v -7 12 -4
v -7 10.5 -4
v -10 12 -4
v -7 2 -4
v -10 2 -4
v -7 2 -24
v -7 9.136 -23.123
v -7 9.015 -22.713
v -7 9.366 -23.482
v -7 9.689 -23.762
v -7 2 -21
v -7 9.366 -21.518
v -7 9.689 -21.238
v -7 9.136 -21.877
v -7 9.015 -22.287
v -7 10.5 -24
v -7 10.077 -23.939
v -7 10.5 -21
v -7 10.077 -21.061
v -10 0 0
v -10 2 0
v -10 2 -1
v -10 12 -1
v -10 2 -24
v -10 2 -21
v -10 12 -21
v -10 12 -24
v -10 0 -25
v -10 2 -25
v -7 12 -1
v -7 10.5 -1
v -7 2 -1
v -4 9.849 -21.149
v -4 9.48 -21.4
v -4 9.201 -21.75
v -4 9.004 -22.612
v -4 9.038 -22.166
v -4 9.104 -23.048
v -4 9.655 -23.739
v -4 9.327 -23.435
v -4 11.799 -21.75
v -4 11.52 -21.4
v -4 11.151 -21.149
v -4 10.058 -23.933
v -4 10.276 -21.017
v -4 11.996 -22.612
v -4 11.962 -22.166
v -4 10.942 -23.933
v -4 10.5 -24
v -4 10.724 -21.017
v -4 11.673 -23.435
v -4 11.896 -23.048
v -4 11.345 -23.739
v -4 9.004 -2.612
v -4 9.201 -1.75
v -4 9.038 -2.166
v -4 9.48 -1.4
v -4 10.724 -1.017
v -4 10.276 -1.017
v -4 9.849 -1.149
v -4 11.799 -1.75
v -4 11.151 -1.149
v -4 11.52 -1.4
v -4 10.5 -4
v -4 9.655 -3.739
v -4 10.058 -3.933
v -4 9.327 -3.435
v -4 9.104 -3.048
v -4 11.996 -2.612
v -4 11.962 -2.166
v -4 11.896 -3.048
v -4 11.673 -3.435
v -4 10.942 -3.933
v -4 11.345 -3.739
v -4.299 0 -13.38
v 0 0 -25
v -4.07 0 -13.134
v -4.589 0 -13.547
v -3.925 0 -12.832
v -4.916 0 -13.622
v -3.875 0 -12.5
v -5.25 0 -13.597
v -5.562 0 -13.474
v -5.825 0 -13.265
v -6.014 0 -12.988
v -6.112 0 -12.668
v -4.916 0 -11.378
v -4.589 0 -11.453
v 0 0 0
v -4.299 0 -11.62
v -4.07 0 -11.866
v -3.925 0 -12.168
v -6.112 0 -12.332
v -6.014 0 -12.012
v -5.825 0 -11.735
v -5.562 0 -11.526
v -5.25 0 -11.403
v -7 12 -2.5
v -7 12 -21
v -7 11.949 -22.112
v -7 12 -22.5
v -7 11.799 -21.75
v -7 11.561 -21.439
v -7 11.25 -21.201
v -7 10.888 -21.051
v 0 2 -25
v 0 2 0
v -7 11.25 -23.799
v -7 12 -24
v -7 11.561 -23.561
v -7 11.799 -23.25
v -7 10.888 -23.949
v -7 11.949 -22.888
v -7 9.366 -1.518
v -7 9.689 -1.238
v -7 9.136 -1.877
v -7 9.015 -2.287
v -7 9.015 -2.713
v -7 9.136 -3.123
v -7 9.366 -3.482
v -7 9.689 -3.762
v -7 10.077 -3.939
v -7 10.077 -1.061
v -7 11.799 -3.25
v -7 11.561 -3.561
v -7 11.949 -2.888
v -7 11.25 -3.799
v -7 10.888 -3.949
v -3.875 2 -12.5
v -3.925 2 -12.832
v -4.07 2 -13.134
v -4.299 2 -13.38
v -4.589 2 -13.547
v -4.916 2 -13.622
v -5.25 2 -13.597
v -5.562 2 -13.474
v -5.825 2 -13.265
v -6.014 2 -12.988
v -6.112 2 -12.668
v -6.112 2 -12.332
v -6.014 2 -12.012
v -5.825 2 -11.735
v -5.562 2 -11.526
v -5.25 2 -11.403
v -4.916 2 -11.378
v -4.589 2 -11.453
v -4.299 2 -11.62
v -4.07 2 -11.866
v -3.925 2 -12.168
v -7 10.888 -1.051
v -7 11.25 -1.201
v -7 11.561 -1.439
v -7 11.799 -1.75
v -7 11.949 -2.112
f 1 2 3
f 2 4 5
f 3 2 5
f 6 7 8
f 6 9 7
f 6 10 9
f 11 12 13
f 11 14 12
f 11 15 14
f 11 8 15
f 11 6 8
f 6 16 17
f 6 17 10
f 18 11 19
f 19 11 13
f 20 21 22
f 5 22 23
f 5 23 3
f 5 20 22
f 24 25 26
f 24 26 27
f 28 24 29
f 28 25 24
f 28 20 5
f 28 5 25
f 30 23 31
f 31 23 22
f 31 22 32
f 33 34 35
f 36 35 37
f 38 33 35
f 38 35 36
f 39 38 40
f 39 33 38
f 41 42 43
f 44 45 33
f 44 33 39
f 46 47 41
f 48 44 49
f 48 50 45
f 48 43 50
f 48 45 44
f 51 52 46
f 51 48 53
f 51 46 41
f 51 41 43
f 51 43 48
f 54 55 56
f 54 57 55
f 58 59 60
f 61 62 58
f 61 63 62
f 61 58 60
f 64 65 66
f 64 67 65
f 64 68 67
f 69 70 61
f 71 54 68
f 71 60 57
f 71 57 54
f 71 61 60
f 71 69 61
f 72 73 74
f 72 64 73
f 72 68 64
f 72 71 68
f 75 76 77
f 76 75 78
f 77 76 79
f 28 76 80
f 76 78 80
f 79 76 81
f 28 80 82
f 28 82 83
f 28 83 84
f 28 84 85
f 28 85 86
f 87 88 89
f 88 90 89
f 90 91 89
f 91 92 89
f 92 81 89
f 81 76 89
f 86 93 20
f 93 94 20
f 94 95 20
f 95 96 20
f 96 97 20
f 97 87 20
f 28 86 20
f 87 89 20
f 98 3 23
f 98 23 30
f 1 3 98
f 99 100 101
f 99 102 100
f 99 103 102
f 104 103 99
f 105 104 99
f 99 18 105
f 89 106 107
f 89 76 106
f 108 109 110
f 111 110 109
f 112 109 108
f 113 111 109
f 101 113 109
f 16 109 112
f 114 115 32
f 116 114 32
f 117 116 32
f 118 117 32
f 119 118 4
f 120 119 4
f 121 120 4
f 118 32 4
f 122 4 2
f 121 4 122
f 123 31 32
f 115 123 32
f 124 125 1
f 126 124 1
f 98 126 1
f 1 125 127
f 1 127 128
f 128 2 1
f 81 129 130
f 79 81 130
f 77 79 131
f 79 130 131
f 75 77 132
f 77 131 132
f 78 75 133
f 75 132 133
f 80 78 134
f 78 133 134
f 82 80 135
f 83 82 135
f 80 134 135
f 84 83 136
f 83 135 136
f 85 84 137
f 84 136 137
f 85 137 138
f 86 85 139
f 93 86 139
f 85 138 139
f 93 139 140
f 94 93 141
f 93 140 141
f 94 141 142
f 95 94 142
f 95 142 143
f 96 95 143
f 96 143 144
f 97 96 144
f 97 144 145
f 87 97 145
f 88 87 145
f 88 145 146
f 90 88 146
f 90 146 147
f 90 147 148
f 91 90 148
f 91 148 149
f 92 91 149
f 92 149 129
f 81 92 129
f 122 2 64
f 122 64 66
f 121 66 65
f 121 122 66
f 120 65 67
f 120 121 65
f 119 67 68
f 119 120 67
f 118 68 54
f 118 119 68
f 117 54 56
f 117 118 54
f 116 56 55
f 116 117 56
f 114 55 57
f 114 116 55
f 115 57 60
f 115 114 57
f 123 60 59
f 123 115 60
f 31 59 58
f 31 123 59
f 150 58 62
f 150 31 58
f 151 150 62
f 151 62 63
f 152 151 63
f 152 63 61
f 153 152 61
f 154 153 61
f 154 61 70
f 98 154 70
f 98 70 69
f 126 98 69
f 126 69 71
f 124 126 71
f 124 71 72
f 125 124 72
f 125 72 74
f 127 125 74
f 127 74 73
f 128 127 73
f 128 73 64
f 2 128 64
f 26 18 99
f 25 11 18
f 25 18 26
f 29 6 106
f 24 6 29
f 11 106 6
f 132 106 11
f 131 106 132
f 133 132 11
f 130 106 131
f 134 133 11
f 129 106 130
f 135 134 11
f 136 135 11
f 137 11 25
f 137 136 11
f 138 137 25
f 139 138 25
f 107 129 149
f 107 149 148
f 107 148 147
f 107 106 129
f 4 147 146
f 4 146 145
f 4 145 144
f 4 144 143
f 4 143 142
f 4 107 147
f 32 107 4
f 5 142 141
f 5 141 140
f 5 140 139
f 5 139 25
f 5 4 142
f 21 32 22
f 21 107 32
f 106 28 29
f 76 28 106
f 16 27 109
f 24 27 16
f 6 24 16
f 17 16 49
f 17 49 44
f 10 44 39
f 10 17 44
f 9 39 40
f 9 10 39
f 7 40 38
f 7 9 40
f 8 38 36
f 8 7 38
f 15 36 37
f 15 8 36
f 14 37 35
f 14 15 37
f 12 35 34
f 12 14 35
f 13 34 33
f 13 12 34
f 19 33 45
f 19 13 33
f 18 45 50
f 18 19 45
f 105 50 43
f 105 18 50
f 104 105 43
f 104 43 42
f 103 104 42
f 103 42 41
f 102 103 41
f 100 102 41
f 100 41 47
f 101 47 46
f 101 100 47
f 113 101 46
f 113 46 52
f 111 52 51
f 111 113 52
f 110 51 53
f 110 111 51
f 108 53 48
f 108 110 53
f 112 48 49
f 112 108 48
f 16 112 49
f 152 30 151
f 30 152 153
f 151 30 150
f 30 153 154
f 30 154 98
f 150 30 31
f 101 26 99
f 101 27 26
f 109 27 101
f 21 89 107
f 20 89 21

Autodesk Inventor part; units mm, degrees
ref_plane "YZ Plane" through (0, 0, 0) normal (1, 0, 0) x (0, 1, 0)
ref_plane "XZ Plane" through (0, 0, 0) normal (0, 1, 0) x (-1, 0, 0)
ref_plane "XY Plane" through (0, 0, 0) normal (0, 0, 1) x (1, 0, 0)
sketch "Sketch1" plane through (0, 0, 0) normal (0, 1, 0) x (-1, 0, 0)
  line L0 (0, 0) -> (10, 0)
  line L1 (10, 0) -> (10, -25)
  line L2 (10, -25) -> (0, -25)
  line L3 (0, -25) -> (0, 0)
  dimension "d0" = 10
  dimension "d1" = 25
extrude "Extrusion1" add sketch "Sketch1" along normal blind 2
sketch "Sketch2" plane through (0, 2, 0) normal (0, 1, 0) x (1, 0, 0)
  line L0 (-10, 0) -> (0, 0) projected
  line L1 (-10, 0) -> (-10, 1)
  line L2 (-10, 1) -> (-7, 1)
  line L3 (-7, 1) -> (-7, 4)
  line L4 (-7, 4) -> (-10, 4)
  line L5 (-10, 4) -> (-10, 1)
  line L6 (0, 25) -> (-10, 25) projected
  line L7 (-10, 25) -> (-10, 24)
  line L8 (-10, 24) -> (-7, 24)
  line L9 (-7, 24) -> (-7, 21)
  line L10 (-7, 21) -> (-10, 21)
  line L11 (-10, 21) -> (-10, 24)
  dimension "d4" = 1
  dimension "d5" = 3
  dimension "d6" = 3
  dimension "d7" = 1
  dimension "d8" = 3
  dimension "d9" = 3
extrude "Extrusion2" add sketch "Sketch2" along normal blind 10
sketch "Sketch3" plane through (-7, 2, -1) normal (1, 0, 0) x (0, 0, -1)
  line L0 (0, 0) -> (0, 10) projected
  line L1 (0, 10) -> (1.5, 10)
  line L2 (1.5, 10) -> (1.5, 8.5)
  line L3 (1.5, 8.5) -> (0, 8.5)
  line L4 (0, 8.5) -> (0, 10)
  line L5 (23, 10) -> (20, 10) projected
  line L6 (23, 10) -> (21.5, 10)
  line L7 (21.5, 10) -> (21.5, 8.5)
  line L8 (21.5, 8.5) -> (23, 8.5)
  line L9 (23, 8.5) -> (23, 10)
  circle A0 centre (1.5, 8.5) radius 1.5
  circle A1 centre (21.5, 8.5) radius 1.5
  point P0 (-1, -2)
  dimension "d12" = 1.5
  dimension "d13" = 1.5
  dimension "d14" = 1.5
  dimension "d15" = 1.5
  dimension "d16" = 3
  dimension "d17" = 3
extrude "Extrusion3" add sketch "Sketch3" along normal blind 3 contours A0 L2 L3 | L3 L2 A0 | A1 L8 L7 | L7 L8 A1
sketch "Sketch4" plane through (0, 2, 0) normal (0, 1, 0) x (1, 0, 0)
  line L0 (0, 0) -> (-5, 0)
  line L1 (-5, 0) -> (-5, 12.5)
  line L2 (-5, 12.5) -> (0, 12.5)
  line L3 (0, 12.5) -> (0, 0)
  circle A0 centre (-5, 12.5) radius 1.125
  dimension "d20" = 5
  dimension "d21" = 12.5
  dimension "d22" = 2.25
extrude "Extrusion4" cut sketch "Sketch4" against normal blind 2 contours A0 L2 L1 | L1 L2 A0
properties part number "LaserMountTop"
